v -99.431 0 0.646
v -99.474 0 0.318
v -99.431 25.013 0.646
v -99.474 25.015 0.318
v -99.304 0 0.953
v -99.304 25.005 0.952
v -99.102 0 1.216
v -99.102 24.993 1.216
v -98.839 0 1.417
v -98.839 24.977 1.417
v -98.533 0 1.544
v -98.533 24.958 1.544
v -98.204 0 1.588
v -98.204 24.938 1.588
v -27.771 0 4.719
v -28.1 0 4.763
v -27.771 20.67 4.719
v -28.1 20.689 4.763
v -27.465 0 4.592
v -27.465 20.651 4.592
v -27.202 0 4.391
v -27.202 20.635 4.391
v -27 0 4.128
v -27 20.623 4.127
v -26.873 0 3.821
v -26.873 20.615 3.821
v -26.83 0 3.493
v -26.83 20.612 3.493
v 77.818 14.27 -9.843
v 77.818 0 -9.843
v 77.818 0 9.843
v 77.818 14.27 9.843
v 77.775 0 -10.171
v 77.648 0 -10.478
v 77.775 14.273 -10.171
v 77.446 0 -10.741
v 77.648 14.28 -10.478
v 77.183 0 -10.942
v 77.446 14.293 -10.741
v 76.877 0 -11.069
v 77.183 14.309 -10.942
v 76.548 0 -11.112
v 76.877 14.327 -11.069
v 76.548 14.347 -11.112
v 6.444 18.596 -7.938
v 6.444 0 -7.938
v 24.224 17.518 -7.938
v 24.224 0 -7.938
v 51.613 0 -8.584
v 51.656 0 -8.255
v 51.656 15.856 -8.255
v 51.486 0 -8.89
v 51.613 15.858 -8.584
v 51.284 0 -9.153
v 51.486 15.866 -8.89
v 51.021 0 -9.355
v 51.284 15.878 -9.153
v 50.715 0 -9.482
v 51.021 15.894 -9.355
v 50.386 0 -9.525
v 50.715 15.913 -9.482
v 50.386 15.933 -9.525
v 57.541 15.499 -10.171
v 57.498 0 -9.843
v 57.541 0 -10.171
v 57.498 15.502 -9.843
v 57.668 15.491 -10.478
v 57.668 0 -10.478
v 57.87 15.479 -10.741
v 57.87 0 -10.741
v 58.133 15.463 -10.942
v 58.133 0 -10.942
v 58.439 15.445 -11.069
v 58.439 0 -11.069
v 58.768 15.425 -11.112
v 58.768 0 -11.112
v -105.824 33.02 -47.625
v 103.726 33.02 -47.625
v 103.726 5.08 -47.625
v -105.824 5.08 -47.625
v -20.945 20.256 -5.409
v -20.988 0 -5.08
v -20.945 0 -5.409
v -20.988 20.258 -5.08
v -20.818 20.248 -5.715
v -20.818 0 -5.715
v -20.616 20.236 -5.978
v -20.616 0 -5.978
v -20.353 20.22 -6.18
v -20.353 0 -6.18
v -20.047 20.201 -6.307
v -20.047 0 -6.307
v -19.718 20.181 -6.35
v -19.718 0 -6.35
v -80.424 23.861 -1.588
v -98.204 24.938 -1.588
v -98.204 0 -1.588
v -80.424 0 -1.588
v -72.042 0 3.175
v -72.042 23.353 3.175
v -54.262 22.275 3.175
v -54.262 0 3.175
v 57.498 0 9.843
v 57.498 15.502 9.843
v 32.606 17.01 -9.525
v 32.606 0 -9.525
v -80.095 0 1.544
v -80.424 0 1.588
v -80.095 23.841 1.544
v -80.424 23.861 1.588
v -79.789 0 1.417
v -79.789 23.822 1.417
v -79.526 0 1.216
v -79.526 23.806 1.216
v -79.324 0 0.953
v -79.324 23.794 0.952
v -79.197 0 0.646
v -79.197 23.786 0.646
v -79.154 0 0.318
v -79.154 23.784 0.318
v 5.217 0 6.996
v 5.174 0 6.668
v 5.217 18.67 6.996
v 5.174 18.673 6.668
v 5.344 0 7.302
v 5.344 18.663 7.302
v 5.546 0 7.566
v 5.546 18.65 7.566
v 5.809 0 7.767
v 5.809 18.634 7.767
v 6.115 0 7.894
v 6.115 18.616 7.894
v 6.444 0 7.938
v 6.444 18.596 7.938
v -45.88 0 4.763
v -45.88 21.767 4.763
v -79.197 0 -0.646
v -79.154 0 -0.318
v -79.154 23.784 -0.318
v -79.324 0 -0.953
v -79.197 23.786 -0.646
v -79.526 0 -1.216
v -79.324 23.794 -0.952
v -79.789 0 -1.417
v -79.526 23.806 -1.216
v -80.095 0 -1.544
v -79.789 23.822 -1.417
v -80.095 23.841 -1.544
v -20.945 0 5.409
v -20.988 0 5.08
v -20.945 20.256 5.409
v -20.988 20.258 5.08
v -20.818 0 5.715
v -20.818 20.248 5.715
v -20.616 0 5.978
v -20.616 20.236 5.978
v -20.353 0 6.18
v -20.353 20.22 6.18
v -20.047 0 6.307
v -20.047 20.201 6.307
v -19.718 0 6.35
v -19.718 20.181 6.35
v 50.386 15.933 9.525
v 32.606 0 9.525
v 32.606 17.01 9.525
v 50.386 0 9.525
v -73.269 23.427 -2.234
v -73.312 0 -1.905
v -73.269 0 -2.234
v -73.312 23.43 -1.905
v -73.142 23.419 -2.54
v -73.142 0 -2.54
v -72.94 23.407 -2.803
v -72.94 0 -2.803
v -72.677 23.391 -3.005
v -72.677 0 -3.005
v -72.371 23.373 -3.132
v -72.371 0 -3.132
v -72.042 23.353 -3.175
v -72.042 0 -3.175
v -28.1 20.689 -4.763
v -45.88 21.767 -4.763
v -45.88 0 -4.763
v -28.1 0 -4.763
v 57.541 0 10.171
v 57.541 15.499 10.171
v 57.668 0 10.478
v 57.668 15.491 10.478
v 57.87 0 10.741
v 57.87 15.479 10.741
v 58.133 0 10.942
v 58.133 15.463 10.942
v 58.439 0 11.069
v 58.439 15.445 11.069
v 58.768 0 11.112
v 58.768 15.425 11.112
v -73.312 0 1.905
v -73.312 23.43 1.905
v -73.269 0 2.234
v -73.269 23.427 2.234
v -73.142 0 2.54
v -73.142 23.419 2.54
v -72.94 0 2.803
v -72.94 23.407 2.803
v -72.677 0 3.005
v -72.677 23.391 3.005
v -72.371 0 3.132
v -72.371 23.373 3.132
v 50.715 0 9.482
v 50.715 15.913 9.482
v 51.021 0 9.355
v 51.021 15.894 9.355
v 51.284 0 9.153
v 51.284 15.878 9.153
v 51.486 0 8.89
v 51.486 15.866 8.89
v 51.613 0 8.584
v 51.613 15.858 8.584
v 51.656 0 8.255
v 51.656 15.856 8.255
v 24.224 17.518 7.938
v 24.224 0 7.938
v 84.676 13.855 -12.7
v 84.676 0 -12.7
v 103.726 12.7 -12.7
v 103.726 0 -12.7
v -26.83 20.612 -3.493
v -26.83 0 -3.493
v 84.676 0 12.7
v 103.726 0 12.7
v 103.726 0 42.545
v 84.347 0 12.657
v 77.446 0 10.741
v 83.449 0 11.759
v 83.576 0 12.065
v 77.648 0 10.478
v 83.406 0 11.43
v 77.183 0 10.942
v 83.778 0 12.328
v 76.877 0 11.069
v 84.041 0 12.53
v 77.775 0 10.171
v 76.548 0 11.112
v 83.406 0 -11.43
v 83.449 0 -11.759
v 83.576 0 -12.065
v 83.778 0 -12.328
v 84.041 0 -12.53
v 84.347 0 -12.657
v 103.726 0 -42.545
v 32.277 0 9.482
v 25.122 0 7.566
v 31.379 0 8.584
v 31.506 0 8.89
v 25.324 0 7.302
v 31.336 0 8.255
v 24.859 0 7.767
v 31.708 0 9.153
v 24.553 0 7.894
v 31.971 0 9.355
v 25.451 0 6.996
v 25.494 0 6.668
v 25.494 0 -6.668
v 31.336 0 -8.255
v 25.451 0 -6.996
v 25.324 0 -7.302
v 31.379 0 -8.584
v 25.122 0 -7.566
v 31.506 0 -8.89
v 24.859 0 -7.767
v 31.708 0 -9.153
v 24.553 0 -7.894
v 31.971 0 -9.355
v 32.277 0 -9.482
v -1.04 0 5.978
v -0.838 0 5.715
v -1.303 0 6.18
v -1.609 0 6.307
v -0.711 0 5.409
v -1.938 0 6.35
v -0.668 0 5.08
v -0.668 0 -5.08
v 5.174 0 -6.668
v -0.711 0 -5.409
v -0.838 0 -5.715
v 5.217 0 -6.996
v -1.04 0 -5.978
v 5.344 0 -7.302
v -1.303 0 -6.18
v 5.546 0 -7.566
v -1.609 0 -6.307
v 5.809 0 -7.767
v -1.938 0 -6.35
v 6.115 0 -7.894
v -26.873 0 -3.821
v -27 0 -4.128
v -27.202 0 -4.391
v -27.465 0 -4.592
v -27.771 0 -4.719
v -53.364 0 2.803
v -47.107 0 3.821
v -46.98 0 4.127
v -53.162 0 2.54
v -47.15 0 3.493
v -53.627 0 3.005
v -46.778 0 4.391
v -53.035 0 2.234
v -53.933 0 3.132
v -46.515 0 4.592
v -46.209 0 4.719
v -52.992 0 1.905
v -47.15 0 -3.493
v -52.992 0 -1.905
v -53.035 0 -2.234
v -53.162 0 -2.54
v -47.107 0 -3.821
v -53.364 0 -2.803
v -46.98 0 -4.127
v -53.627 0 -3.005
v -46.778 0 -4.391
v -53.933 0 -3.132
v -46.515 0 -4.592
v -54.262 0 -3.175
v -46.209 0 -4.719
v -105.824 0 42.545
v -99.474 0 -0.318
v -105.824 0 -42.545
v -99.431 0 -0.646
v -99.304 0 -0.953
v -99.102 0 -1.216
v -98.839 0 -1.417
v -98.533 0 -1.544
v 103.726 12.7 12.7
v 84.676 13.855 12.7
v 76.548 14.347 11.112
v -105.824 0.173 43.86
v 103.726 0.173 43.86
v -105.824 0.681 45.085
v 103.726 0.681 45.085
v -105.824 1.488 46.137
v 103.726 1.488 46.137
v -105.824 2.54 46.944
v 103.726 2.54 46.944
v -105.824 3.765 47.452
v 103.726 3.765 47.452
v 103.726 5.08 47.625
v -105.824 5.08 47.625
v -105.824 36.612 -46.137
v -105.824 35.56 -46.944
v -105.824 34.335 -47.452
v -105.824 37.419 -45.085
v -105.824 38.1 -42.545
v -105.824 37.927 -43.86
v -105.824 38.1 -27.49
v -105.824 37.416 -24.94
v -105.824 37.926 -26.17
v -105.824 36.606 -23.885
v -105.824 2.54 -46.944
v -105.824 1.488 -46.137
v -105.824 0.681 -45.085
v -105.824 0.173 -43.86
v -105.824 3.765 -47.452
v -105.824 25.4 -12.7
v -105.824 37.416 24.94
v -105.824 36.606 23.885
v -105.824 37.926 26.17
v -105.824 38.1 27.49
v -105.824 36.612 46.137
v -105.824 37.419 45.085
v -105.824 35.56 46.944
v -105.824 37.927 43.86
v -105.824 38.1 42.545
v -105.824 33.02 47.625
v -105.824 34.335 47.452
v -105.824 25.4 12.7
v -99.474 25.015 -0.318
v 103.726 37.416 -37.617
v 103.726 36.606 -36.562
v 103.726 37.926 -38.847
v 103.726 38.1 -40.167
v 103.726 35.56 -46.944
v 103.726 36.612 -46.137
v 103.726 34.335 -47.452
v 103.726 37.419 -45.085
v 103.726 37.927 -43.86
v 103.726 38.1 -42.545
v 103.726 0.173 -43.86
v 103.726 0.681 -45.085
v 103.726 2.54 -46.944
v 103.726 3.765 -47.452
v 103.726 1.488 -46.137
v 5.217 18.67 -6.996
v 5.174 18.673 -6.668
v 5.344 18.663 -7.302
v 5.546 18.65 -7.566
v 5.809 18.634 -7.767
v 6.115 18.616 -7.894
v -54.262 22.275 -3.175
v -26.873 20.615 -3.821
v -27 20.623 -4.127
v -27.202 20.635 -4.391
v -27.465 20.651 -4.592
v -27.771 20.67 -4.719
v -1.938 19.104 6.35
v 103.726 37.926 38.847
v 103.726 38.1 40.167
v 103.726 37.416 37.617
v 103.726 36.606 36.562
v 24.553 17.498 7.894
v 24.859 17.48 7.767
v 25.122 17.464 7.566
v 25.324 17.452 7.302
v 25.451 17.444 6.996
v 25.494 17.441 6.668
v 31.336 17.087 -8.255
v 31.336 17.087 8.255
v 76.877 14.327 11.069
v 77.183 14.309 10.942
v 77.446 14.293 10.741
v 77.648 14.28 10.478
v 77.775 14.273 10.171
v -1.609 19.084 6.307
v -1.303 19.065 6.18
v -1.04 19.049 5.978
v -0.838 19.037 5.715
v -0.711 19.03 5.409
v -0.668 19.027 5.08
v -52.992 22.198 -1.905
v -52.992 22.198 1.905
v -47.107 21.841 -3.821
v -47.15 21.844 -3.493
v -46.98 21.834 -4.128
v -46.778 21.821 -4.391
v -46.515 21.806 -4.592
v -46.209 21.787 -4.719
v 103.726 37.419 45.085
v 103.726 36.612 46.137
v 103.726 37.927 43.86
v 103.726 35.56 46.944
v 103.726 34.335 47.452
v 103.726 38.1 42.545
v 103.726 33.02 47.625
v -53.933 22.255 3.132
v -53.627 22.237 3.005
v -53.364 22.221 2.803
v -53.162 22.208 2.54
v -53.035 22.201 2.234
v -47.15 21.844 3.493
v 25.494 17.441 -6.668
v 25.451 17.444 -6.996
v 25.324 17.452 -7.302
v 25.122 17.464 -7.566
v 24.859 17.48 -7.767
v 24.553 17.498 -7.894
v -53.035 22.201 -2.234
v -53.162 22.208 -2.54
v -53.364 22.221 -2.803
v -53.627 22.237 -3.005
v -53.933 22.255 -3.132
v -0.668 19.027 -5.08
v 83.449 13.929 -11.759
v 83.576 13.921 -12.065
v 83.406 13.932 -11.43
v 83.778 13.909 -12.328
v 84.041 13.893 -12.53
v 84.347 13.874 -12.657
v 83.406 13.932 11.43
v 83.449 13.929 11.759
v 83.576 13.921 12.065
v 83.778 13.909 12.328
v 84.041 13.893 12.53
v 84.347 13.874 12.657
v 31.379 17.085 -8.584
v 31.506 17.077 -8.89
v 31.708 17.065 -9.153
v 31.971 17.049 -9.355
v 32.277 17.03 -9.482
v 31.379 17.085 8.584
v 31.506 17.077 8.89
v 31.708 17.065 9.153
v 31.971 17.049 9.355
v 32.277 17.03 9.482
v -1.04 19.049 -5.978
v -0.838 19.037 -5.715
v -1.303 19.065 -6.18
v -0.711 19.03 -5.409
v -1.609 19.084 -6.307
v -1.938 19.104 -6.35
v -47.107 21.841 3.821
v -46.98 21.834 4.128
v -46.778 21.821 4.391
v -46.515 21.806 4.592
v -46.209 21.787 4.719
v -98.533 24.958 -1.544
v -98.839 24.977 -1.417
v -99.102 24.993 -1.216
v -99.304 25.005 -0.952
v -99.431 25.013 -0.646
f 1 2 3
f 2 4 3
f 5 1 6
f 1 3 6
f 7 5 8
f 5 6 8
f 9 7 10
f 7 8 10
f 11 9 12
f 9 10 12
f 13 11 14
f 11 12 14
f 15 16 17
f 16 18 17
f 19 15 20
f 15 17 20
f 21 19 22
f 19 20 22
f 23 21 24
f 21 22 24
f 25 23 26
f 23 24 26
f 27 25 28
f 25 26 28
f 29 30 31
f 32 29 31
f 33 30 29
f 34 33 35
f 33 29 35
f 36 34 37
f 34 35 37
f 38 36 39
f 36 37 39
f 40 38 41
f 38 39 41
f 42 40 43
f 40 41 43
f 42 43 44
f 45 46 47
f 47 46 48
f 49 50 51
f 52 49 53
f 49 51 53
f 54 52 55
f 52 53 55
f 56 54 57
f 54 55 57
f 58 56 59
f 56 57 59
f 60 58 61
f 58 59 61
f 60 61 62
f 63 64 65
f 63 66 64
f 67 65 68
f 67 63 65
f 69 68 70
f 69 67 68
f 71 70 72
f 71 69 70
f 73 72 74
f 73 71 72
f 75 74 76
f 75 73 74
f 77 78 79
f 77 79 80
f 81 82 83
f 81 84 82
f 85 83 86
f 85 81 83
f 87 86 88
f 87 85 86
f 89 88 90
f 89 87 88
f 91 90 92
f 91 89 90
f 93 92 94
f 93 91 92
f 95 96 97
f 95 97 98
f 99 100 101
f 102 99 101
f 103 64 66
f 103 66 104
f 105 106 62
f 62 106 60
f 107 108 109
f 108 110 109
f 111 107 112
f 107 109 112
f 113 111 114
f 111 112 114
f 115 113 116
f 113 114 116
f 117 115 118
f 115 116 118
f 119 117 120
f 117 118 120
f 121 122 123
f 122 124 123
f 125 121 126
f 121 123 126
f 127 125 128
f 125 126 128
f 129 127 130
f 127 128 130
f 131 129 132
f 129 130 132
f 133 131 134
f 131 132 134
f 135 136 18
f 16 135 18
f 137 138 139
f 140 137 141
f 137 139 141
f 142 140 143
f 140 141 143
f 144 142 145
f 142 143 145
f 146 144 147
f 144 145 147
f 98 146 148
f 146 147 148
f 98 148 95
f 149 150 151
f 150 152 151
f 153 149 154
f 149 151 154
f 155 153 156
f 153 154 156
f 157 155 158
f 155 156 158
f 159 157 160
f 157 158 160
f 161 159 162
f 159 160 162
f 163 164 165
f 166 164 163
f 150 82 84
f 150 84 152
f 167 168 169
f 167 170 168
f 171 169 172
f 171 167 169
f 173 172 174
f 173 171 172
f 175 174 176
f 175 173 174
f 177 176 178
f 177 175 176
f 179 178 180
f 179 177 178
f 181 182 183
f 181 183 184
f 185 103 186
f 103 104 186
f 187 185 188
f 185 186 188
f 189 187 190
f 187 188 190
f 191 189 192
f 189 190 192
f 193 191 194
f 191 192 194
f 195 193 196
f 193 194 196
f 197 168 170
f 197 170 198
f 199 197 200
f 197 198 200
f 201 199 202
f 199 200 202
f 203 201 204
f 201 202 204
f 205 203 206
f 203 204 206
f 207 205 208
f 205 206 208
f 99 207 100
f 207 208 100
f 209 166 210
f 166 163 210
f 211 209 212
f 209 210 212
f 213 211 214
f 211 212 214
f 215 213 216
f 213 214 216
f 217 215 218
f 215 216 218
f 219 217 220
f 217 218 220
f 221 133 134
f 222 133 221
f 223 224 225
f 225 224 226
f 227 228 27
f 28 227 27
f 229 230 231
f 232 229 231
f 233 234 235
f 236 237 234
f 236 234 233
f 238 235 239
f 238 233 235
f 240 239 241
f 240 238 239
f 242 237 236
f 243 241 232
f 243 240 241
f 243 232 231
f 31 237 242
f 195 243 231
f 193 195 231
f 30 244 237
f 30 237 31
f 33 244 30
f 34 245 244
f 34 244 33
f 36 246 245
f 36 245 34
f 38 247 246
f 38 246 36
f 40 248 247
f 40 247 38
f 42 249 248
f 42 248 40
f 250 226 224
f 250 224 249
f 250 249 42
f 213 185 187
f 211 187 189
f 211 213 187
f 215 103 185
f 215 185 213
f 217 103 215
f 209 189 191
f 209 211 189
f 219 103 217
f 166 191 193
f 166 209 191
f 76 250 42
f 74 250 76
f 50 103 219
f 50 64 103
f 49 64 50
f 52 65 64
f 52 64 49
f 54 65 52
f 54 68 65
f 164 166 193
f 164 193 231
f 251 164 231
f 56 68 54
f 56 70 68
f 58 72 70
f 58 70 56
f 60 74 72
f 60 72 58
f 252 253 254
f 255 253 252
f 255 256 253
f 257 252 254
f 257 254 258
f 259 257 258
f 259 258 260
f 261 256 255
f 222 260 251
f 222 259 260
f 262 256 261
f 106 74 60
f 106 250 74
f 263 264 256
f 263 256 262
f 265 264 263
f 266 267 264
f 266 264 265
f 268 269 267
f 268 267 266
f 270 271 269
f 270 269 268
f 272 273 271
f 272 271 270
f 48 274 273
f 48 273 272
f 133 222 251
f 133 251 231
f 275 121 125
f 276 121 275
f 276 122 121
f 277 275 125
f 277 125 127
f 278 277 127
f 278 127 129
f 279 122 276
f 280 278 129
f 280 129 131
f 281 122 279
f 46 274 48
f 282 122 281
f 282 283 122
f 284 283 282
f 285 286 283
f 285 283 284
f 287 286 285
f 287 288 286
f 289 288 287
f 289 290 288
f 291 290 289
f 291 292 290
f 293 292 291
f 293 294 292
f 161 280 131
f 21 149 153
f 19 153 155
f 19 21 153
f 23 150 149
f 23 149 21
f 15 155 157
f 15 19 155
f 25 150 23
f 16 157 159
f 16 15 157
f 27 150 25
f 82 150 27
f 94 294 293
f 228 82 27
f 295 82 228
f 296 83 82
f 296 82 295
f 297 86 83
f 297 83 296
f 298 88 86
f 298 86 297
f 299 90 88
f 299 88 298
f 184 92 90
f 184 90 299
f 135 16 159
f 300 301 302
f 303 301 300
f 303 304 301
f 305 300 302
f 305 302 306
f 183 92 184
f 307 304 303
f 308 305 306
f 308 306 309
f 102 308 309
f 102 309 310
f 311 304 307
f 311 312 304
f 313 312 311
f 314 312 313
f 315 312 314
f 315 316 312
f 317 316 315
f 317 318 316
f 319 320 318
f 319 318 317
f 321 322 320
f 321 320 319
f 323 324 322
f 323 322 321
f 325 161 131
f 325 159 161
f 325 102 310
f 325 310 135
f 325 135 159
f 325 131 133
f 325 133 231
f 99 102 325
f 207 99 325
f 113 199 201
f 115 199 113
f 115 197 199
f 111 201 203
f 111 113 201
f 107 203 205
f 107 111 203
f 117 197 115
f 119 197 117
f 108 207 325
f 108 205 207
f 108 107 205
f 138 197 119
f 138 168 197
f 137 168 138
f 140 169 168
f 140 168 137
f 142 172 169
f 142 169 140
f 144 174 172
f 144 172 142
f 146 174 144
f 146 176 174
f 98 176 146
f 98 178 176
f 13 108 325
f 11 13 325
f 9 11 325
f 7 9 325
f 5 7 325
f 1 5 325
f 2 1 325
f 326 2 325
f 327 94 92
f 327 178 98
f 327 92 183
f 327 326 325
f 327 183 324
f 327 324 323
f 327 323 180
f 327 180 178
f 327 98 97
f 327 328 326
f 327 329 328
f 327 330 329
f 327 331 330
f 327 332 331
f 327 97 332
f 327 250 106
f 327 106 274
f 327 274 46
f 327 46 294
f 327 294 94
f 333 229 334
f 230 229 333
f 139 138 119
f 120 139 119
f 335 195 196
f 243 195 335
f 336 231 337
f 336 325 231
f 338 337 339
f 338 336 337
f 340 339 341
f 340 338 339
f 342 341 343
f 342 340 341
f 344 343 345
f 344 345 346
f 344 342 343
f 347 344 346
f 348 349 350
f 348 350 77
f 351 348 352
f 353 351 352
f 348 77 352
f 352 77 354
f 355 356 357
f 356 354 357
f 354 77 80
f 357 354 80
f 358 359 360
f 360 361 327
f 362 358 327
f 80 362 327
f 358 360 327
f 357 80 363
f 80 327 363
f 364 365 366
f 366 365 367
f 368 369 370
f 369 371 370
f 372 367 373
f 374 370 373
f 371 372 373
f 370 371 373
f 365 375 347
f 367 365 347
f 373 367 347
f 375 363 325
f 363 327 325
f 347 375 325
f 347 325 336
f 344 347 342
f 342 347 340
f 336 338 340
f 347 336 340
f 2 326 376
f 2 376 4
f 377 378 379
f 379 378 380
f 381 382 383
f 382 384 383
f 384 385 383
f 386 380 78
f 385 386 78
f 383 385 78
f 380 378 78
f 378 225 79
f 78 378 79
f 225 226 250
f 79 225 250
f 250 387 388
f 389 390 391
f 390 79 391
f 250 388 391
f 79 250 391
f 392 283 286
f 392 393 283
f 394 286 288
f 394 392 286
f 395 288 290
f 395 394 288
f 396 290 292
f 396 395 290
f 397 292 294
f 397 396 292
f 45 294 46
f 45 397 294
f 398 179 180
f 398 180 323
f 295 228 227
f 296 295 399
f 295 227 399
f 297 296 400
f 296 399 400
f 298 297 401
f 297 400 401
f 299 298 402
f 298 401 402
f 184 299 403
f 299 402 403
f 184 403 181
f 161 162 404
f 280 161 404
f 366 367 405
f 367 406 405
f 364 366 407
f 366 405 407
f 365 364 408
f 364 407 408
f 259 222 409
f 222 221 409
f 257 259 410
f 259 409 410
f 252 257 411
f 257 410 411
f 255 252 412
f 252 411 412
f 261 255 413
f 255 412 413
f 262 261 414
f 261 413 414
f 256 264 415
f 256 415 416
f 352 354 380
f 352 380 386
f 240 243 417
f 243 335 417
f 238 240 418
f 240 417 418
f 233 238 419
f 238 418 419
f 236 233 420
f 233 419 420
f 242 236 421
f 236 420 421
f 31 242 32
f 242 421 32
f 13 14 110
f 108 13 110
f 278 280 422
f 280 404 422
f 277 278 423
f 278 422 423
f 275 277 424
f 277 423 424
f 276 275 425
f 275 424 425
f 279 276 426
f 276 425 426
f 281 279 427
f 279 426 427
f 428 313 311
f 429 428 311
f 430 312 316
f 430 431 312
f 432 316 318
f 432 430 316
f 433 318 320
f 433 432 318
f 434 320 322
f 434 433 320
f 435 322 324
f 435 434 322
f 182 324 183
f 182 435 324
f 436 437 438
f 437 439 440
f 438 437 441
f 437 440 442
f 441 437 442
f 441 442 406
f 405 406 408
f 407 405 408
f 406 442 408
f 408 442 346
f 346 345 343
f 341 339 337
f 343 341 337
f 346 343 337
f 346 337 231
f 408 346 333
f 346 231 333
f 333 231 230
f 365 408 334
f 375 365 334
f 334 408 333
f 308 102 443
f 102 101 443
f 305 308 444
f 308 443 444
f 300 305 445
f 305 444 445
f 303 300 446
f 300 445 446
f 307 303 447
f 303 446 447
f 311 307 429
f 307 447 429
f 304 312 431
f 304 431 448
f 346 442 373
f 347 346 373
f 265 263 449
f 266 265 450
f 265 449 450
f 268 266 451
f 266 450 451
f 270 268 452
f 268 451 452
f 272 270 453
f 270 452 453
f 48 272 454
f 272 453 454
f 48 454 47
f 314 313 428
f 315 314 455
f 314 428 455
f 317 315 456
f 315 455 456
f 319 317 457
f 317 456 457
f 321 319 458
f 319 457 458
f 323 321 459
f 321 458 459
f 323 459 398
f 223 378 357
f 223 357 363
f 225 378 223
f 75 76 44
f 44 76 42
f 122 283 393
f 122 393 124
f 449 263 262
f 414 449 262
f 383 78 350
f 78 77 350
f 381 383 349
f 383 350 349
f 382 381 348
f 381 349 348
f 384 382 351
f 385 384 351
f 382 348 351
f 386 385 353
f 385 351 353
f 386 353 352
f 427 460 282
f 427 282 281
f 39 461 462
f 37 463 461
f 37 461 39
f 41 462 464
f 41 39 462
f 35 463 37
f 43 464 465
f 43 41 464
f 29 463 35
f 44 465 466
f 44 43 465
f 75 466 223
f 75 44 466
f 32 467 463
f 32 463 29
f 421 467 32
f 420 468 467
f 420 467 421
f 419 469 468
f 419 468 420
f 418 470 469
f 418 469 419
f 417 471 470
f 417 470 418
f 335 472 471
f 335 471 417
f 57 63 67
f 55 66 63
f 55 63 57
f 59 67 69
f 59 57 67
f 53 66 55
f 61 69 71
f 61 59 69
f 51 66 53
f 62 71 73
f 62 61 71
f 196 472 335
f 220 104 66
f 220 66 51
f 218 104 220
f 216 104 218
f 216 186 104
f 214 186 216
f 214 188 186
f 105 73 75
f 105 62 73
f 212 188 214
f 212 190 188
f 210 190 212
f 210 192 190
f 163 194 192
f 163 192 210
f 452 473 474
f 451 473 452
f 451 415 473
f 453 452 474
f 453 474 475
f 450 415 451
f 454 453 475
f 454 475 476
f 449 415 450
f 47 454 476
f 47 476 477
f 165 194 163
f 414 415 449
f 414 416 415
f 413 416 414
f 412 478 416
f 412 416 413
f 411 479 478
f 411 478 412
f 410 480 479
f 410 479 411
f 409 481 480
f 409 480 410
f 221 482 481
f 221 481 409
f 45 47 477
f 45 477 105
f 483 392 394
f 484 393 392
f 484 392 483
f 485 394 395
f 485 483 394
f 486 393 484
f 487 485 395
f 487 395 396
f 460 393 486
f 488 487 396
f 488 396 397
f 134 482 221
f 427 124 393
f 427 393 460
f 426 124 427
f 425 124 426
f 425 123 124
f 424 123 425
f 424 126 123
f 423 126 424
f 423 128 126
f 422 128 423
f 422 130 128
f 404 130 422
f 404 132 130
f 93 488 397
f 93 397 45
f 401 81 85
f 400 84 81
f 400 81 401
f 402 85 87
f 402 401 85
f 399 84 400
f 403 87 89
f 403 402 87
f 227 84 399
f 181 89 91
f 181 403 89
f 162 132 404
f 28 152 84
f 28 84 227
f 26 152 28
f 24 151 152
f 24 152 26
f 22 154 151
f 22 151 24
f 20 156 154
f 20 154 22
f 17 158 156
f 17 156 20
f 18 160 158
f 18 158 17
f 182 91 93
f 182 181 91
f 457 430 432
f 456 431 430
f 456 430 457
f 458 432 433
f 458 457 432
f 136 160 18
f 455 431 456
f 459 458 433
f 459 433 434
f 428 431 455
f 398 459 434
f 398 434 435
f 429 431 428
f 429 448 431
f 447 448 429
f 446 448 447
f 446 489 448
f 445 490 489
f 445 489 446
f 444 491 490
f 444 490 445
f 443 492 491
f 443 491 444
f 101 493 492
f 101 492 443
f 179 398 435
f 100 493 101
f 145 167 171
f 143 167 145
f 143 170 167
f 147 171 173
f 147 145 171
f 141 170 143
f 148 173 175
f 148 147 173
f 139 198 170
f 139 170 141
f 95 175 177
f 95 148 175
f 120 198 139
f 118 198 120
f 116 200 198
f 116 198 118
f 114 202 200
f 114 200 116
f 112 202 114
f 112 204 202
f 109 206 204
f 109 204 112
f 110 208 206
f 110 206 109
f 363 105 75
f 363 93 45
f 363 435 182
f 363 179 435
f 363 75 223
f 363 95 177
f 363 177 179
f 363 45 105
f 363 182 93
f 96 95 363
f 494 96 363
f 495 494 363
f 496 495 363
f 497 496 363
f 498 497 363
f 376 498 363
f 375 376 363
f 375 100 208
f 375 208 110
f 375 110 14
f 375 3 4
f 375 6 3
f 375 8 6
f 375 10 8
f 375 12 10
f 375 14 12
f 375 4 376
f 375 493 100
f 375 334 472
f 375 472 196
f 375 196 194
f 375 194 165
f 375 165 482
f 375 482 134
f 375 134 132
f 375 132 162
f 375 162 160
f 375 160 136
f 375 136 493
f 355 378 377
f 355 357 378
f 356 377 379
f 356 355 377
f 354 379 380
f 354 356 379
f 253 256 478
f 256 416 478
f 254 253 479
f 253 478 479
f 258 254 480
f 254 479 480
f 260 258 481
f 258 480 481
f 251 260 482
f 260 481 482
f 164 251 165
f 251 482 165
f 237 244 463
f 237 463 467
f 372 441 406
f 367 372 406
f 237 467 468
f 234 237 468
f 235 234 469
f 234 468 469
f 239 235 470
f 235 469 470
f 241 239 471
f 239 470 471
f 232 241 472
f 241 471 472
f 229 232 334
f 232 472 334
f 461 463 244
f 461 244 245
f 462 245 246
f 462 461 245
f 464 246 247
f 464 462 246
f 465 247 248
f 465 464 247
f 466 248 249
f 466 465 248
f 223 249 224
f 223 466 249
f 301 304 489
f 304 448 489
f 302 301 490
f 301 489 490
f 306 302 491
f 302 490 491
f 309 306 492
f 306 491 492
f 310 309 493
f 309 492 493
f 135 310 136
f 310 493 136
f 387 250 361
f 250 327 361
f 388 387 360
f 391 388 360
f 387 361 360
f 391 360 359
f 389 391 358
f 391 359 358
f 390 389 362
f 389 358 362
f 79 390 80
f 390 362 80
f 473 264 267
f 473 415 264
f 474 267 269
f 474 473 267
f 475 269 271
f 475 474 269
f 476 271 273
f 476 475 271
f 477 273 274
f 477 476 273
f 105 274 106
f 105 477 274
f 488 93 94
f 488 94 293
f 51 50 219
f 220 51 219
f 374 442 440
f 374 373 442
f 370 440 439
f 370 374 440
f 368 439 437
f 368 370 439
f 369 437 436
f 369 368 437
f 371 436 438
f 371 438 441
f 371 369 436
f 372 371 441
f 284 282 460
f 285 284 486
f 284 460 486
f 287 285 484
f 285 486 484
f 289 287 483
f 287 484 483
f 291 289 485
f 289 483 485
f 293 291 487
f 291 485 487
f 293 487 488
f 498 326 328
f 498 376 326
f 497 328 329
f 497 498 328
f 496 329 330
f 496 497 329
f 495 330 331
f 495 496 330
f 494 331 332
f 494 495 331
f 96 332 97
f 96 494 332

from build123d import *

# Parameters (mm, degrees)
BOSS_EXTRUDE1_DEPTH = 38.1
SKETCH2_W           = 209.55
SKETCH2_H           = 38.1
BOSS_EXTRUDE2_DEPTH = 9.525
SKETCH3_W           = 20.32
SKETCH3_H           = 3.175
SKETCH3_H_2         = 6.35
SKETCH3_H_3         = 9.525
SKETCH3_H_4         = 12.7
SKETCH3_H_5         = 15.875
SKETCH3_H_6         = 19.05
SKETCH3_H_7         = 22.225
SKETCH3_H_8         = 25.4
CUT_EXTRUDE1_DEPTH  = 123.141181515
CHAMFER1_SIZE       = 25.4
CHAMFER2_SIZE       = 25.4
FILLET1_R           = 1.27
FILLET2_R           = 5.08


with BuildPart() as part:
    # Sketch1 → Boss-Extrude1 (new, symmetric)
    with BuildSketch(Plane.XY):
        Polygon((-105.823993484, 0), (103.726006516, 0), (103.726006516, 12.7), (-105.823993484, 25.4), align=None)
    extrude(amount=BOSS_EXTRUDE1_DEPTH, both=True)

    # Sketch2 → Boss-Extrude2 (add)
    with BuildSketch(Plane(origin=(0, 0, -38.1), x_dir=(-1, 0, 0), z_dir=(0, 0, -1))):
        with Locations((1.048993484, 19.05)):
            Rectangle(SKETCH2_W, SKETCH2_H)
    boss_extrude2 = extrude(amount=BOSS_EXTRUDE2_DEPTH)

    # Mirror1: Boss-Extrude2 across plane
    add(boss_extrude2.mirror(Plane.XY))

    # Sketch3 → Cut-Extrude1 (cut, through all)
    with BuildSketch(Plane.XZ):
        with Locations((-89.313993484, 0)):
            Rectangle(SKETCH3_W, SKETCH3_H)
        with Locations((-63.151993484, 0)):
            Rectangle(SKETCH3_W, SKETCH3_H_2)
        with Locations((-36.989993484, 0)):
            Rectangle(SKETCH3_W, SKETCH3_H_3)
        with Locations((-10.827993484, 0)):
            Rectangle(SKETCH3_W, SKETCH3_H_4)
        with Locations((15.334006516, 0)):
            Rectangle(SKETCH3_W, SKETCH3_H_5)
        with Locations((41.496006516, 0)):
            Rectangle(SKETCH3_W, SKETCH3_H_6)
        with Locations((67.658006516, 0)):
            Rectangle(SKETCH3_W, SKETCH3_H_7)
        with Locations((93.566006516, 0)):
            Rectangle(SKETCH3_W, SKETCH3_H_8)
    extrude(amount=-CUT_EXTRUDE1_DEPTH, mode=Mode.SUBTRACT)

    # Chamfer1
    # the kernel refuses this chamfer: 25.4 mm, written as the material it adds along each edge
    with BuildSketch(Plane(origin=(168.92711924, 8.748417411, 38.1), x_dir=(0.060472188242602316, 0.9977911060029382, 0.02749587661058647), z_dir=(-0.9981684966311909, 0.06049506040189036, 0))) as chamfer1_piece_1_section:
        Polygon((CHAMFER1_SIZE * 0.999621916911, CHAMFER1_SIZE * 0.0274958766106), (-CHAMFER1_SIZE * 0.0274958766106, CHAMFER1_SIZE * 0.999621916911), (0, 0), align=None)
    chamfer1_piece_1 = extrude(amount=340.575991525, mode=Mode.PRIVATE)
    chamfer1_piece_1 = split(chamfer1_piece_1, bisect_by=Plane(origin=(103.726006516, 21.644739683, 29.711789503), z_dir=(-1, 0, 0)), keep=Keep.TOP, mode=Mode.PRIVATE)
    chamfer1_piece_1 = split(chamfer1_piece_1, bisect_by=Plane(origin=(93.576497018, 21.644739683, 12.7), z_dir=(0, 0, 1)), keep=Keep.TOP, mode=Mode.PRIVATE)
    chamfer1_piece_1 = split(chamfer1_piece_1, bisect_by=Plane(origin=(83.406006516, 21.644739683, 29.711789503), z_dir=(1, 0, 0)), keep=Keep.TOP, mode=Mode.PRIVATE)
    chamfer1_piece_1 = split(chamfer1_piece_1, bisect_by=Plane(origin=(93.576497018, 38.1, 29.711789503), z_dir=(0, -1, 0)), keep=Keep.TOP, mode=Mode.PRIVATE)
    add(chamfer1_piece_1)
    with BuildSketch(Plane(origin=(168.92711924, 8.748417411, 38.1), x_dir=(0.060472188242602316, 0.9977911060029382, 0.02749587661058647), z_dir=(-0.9981684966311909, 0.06049506040189036, 0))) as chamfer1_piece_2_section:
        Polygon((CHAMFER1_SIZE * 0.999621916911, CHAMFER1_SIZE * 0.0274958766106), (-CHAMFER1_SIZE * 0.0274958766106, CHAMFER1_SIZE * 0.999621916911), (0, 0), align=None)
    chamfer1_piece_2 = extrude(amount=340.575991525, mode=Mode.PRIVATE)
    chamfer1_piece_2 = split(chamfer1_piece_2, bisect_by=Plane(origin=(-105.823993484, 26.508792165, 29.076634432), z_dir=(1, 0, 0)), keep=Keep.TOP, mode=Mode.PRIVATE)
    chamfer1_piece_2 = split(chamfer1_piece_2, bisect_by=Plane(origin=(-6.816832876, 26.508792165, 12.7), z_dir=(0, 0, 1)), keep=Keep.TOP, mode=Mode.PRIVATE)
    chamfer1_piece_2 = split(chamfer1_piece_2, bisect_by=Plane(origin=(83.406006516, 26.508792165, 29.076634432), z_dir=(-1, 0, 0)), keep=Keep.TOP, mode=Mode.PRIVATE)
    chamfer1_piece_2 = split(chamfer1_piece_2, bisect_by=Plane(origin=(-6.816832876, 38.1, 29.076634432), z_dir=(0, -1, 0)), keep=Keep.TOP, mode=Mode.PRIVATE)
    add(chamfer1_piece_2)

    # Chamfer2
    # the kernel refuses this chamfer: 25.4 mm, written as the material it adds along each edge
    with BuildSketch(Plane(origin=(168.92711924, 8.748417411, -38.1), x_dir=(0.060472188242602316, 0.9977911060029382, -0.02749587661058647), z_dir=(-0.9981684966311909, 0.06049506040189036, 0))) as chamfer2_piece_1_section:
        Polygon((CHAMFER2_SIZE * 0.999621916911, -CHAMFER2_SIZE * 0.0274958766106), (-CHAMFER2_SIZE * 0.0274958766106, -CHAMFER2_SIZE * 0.999621916911), (0, 0), align=None)
    chamfer2_piece_1 = extrude(amount=340.575991525, mode=Mode.PRIVATE)
    chamfer2_piece_1 = split(chamfer2_piece_1, bisect_by=Plane(origin=(93.576497018, 38.1, -29.711789503), z_dir=(0, -1, 0)), keep=Keep.TOP, mode=Mode.PRIVATE)
    chamfer2_piece_1 = split(chamfer2_piece_1, bisect_by=Plane(origin=(103.726006516, 21.644739683, -29.711789503), z_dir=(-1, 0, 0)), keep=Keep.TOP, mode=Mode.PRIVATE)
    chamfer2_piece_1 = split(chamfer2_piece_1, bisect_by=Plane(origin=(93.576497018, 21.644739683, -12.7), z_dir=(0, 0, -1)), keep=Keep.TOP, mode=Mode.PRIVATE)
    chamfer2_piece_1 = split(chamfer2_piece_1, bisect_by=Plane(origin=(83.406006516, 21.644739683, -29.711789503), z_dir=(1, 0, 0)), keep=Keep.TOP, mode=Mode.PRIVATE)
    add(chamfer2_piece_1)
    with BuildSketch(Plane(origin=(168.92711924, 8.748417411, -38.1), x_dir=(0.060472188242602316, 0.9977911060029382, -0.02749587661058647), z_dir=(-0.9981684966311909, 0.06049506040189036, 0))) as chamfer2_piece_2_section:
        Polygon((CHAMFER2_SIZE * 0.999621916911, -CHAMFER2_SIZE * 0.0274958766106), (-CHAMFER2_SIZE * 0.0274958766106, -CHAMFER2_SIZE * 0.999621916911), (0, 0), align=None)
    chamfer2_piece_2 = extrude(amount=340.575991525, mode=Mode.PRIVATE)
    chamfer2_piece_2 = split(chamfer2_piece_2, bisect_by=Plane(origin=(-105.823993484, 26.508792165, -29.076634432), z_dir=(1, 0, 0)), keep=Keep.TOP, mode=Mode.PRIVATE)
    chamfer2_piece_2 = split(chamfer2_piece_2, bisect_by=Plane(origin=(-6.816832876, 38.1, -29.076634432), z_dir=(0, -1, 0)), keep=Keep.TOP, mode=Mode.PRIVATE)
    chamfer2_piece_2 = split(chamfer2_piece_2, bisect_by=Plane(origin=(-6.816832876, 26.508792165, -12.7), z_dir=(0, 0, -1)), keep=Keep.TOP, mode=Mode.PRIVATE)
    chamfer2_piece_2 = split(chamfer2_piece_2, bisect_by=Plane(origin=(83.406006516, 26.508792165, -29.076634432), z_dir=(-1, 0, 0)), keep=Keep.TOP, mode=Mode.PRIVATE)
    add(chamfer2_piece_2)

    # Fillet1
    fillet1_edges = [part.edges().sort_by_distance(p)[0] for p in [
        (-20.987993484, 10.129212121, -6.35),
        (-20.987993484, 10.129212121, 6.35),
        (-0.667993484, 9.513454545, 6.35),
        (-0.667993484, 9.513454545, -6.35),
        (5.174006516, 9.336424242, -7.9375),
        (5.174006516, 9.336424242, 7.9375),
        (25.494006516, 8.720666667, 7.9375),
        (25.494006516, 8.720666667, -7.9375),
        (31.336006516, 8.543636364, -9.525),
        (31.336006516, 8.543636364, 9.525),
        (51.656006516, 7.927878788, 9.525),
        (51.656006516, 7.927878788, -9.525),
        (57.498006516, 7.750848485, -11.1125),
        (57.498006516, 7.750848485, 11.1125),
        (77.818006516, 7.135090909, 11.1125),
        (77.818006516, 7.135090909, -11.1125),
        (83.406006516, 6.965757576, -12.7),
        (83.406006516, 6.965757576, 12.7),
        (-99.473993484, 12.507575758, 1.5875),
        (-79.153993484, 11.891818182, 1.5875),
        (-79.153993484, 11.891818182, -1.5875),
        (-99.473993484, 12.507575758, -1.5875),
        (-73.311993484, 11.714787879, -3.175),
        (-73.311993484, 11.714787879, 3.175),
        (-52.991993484, 11.099030303, 3.175),
        (-52.991993484, 11.099030303, -3.175),
        (-47.149993484, 10.922, -4.7625),
        (-47.149993484, 10.922, 4.7625),
        (-26.829993484, 10.306242424, 4.7625),
        (-26.829993484, 10.306242424, -4.7625),
    ]]
    fillet(fillet1_edges, radius=FILLET1_R)

    # Fillet2
    fillet2_edges = [part.edges().sort_by_distance(p)[0] for p in [
        (-1.048993484, 0, -47.625),
        (-1.048993484, 38.1, -47.625),
        (-1.048993484, 38.1, 31.715109861),
        (-1.048993484, 38.1, -31.715109861),
        (-1.048993484, 38.1, 47.625),
        (-1.048993484, 0, 47.625),
    ]]
    fillet(fillet2_edges, radius=FILLET2_R)


solid = part.part
